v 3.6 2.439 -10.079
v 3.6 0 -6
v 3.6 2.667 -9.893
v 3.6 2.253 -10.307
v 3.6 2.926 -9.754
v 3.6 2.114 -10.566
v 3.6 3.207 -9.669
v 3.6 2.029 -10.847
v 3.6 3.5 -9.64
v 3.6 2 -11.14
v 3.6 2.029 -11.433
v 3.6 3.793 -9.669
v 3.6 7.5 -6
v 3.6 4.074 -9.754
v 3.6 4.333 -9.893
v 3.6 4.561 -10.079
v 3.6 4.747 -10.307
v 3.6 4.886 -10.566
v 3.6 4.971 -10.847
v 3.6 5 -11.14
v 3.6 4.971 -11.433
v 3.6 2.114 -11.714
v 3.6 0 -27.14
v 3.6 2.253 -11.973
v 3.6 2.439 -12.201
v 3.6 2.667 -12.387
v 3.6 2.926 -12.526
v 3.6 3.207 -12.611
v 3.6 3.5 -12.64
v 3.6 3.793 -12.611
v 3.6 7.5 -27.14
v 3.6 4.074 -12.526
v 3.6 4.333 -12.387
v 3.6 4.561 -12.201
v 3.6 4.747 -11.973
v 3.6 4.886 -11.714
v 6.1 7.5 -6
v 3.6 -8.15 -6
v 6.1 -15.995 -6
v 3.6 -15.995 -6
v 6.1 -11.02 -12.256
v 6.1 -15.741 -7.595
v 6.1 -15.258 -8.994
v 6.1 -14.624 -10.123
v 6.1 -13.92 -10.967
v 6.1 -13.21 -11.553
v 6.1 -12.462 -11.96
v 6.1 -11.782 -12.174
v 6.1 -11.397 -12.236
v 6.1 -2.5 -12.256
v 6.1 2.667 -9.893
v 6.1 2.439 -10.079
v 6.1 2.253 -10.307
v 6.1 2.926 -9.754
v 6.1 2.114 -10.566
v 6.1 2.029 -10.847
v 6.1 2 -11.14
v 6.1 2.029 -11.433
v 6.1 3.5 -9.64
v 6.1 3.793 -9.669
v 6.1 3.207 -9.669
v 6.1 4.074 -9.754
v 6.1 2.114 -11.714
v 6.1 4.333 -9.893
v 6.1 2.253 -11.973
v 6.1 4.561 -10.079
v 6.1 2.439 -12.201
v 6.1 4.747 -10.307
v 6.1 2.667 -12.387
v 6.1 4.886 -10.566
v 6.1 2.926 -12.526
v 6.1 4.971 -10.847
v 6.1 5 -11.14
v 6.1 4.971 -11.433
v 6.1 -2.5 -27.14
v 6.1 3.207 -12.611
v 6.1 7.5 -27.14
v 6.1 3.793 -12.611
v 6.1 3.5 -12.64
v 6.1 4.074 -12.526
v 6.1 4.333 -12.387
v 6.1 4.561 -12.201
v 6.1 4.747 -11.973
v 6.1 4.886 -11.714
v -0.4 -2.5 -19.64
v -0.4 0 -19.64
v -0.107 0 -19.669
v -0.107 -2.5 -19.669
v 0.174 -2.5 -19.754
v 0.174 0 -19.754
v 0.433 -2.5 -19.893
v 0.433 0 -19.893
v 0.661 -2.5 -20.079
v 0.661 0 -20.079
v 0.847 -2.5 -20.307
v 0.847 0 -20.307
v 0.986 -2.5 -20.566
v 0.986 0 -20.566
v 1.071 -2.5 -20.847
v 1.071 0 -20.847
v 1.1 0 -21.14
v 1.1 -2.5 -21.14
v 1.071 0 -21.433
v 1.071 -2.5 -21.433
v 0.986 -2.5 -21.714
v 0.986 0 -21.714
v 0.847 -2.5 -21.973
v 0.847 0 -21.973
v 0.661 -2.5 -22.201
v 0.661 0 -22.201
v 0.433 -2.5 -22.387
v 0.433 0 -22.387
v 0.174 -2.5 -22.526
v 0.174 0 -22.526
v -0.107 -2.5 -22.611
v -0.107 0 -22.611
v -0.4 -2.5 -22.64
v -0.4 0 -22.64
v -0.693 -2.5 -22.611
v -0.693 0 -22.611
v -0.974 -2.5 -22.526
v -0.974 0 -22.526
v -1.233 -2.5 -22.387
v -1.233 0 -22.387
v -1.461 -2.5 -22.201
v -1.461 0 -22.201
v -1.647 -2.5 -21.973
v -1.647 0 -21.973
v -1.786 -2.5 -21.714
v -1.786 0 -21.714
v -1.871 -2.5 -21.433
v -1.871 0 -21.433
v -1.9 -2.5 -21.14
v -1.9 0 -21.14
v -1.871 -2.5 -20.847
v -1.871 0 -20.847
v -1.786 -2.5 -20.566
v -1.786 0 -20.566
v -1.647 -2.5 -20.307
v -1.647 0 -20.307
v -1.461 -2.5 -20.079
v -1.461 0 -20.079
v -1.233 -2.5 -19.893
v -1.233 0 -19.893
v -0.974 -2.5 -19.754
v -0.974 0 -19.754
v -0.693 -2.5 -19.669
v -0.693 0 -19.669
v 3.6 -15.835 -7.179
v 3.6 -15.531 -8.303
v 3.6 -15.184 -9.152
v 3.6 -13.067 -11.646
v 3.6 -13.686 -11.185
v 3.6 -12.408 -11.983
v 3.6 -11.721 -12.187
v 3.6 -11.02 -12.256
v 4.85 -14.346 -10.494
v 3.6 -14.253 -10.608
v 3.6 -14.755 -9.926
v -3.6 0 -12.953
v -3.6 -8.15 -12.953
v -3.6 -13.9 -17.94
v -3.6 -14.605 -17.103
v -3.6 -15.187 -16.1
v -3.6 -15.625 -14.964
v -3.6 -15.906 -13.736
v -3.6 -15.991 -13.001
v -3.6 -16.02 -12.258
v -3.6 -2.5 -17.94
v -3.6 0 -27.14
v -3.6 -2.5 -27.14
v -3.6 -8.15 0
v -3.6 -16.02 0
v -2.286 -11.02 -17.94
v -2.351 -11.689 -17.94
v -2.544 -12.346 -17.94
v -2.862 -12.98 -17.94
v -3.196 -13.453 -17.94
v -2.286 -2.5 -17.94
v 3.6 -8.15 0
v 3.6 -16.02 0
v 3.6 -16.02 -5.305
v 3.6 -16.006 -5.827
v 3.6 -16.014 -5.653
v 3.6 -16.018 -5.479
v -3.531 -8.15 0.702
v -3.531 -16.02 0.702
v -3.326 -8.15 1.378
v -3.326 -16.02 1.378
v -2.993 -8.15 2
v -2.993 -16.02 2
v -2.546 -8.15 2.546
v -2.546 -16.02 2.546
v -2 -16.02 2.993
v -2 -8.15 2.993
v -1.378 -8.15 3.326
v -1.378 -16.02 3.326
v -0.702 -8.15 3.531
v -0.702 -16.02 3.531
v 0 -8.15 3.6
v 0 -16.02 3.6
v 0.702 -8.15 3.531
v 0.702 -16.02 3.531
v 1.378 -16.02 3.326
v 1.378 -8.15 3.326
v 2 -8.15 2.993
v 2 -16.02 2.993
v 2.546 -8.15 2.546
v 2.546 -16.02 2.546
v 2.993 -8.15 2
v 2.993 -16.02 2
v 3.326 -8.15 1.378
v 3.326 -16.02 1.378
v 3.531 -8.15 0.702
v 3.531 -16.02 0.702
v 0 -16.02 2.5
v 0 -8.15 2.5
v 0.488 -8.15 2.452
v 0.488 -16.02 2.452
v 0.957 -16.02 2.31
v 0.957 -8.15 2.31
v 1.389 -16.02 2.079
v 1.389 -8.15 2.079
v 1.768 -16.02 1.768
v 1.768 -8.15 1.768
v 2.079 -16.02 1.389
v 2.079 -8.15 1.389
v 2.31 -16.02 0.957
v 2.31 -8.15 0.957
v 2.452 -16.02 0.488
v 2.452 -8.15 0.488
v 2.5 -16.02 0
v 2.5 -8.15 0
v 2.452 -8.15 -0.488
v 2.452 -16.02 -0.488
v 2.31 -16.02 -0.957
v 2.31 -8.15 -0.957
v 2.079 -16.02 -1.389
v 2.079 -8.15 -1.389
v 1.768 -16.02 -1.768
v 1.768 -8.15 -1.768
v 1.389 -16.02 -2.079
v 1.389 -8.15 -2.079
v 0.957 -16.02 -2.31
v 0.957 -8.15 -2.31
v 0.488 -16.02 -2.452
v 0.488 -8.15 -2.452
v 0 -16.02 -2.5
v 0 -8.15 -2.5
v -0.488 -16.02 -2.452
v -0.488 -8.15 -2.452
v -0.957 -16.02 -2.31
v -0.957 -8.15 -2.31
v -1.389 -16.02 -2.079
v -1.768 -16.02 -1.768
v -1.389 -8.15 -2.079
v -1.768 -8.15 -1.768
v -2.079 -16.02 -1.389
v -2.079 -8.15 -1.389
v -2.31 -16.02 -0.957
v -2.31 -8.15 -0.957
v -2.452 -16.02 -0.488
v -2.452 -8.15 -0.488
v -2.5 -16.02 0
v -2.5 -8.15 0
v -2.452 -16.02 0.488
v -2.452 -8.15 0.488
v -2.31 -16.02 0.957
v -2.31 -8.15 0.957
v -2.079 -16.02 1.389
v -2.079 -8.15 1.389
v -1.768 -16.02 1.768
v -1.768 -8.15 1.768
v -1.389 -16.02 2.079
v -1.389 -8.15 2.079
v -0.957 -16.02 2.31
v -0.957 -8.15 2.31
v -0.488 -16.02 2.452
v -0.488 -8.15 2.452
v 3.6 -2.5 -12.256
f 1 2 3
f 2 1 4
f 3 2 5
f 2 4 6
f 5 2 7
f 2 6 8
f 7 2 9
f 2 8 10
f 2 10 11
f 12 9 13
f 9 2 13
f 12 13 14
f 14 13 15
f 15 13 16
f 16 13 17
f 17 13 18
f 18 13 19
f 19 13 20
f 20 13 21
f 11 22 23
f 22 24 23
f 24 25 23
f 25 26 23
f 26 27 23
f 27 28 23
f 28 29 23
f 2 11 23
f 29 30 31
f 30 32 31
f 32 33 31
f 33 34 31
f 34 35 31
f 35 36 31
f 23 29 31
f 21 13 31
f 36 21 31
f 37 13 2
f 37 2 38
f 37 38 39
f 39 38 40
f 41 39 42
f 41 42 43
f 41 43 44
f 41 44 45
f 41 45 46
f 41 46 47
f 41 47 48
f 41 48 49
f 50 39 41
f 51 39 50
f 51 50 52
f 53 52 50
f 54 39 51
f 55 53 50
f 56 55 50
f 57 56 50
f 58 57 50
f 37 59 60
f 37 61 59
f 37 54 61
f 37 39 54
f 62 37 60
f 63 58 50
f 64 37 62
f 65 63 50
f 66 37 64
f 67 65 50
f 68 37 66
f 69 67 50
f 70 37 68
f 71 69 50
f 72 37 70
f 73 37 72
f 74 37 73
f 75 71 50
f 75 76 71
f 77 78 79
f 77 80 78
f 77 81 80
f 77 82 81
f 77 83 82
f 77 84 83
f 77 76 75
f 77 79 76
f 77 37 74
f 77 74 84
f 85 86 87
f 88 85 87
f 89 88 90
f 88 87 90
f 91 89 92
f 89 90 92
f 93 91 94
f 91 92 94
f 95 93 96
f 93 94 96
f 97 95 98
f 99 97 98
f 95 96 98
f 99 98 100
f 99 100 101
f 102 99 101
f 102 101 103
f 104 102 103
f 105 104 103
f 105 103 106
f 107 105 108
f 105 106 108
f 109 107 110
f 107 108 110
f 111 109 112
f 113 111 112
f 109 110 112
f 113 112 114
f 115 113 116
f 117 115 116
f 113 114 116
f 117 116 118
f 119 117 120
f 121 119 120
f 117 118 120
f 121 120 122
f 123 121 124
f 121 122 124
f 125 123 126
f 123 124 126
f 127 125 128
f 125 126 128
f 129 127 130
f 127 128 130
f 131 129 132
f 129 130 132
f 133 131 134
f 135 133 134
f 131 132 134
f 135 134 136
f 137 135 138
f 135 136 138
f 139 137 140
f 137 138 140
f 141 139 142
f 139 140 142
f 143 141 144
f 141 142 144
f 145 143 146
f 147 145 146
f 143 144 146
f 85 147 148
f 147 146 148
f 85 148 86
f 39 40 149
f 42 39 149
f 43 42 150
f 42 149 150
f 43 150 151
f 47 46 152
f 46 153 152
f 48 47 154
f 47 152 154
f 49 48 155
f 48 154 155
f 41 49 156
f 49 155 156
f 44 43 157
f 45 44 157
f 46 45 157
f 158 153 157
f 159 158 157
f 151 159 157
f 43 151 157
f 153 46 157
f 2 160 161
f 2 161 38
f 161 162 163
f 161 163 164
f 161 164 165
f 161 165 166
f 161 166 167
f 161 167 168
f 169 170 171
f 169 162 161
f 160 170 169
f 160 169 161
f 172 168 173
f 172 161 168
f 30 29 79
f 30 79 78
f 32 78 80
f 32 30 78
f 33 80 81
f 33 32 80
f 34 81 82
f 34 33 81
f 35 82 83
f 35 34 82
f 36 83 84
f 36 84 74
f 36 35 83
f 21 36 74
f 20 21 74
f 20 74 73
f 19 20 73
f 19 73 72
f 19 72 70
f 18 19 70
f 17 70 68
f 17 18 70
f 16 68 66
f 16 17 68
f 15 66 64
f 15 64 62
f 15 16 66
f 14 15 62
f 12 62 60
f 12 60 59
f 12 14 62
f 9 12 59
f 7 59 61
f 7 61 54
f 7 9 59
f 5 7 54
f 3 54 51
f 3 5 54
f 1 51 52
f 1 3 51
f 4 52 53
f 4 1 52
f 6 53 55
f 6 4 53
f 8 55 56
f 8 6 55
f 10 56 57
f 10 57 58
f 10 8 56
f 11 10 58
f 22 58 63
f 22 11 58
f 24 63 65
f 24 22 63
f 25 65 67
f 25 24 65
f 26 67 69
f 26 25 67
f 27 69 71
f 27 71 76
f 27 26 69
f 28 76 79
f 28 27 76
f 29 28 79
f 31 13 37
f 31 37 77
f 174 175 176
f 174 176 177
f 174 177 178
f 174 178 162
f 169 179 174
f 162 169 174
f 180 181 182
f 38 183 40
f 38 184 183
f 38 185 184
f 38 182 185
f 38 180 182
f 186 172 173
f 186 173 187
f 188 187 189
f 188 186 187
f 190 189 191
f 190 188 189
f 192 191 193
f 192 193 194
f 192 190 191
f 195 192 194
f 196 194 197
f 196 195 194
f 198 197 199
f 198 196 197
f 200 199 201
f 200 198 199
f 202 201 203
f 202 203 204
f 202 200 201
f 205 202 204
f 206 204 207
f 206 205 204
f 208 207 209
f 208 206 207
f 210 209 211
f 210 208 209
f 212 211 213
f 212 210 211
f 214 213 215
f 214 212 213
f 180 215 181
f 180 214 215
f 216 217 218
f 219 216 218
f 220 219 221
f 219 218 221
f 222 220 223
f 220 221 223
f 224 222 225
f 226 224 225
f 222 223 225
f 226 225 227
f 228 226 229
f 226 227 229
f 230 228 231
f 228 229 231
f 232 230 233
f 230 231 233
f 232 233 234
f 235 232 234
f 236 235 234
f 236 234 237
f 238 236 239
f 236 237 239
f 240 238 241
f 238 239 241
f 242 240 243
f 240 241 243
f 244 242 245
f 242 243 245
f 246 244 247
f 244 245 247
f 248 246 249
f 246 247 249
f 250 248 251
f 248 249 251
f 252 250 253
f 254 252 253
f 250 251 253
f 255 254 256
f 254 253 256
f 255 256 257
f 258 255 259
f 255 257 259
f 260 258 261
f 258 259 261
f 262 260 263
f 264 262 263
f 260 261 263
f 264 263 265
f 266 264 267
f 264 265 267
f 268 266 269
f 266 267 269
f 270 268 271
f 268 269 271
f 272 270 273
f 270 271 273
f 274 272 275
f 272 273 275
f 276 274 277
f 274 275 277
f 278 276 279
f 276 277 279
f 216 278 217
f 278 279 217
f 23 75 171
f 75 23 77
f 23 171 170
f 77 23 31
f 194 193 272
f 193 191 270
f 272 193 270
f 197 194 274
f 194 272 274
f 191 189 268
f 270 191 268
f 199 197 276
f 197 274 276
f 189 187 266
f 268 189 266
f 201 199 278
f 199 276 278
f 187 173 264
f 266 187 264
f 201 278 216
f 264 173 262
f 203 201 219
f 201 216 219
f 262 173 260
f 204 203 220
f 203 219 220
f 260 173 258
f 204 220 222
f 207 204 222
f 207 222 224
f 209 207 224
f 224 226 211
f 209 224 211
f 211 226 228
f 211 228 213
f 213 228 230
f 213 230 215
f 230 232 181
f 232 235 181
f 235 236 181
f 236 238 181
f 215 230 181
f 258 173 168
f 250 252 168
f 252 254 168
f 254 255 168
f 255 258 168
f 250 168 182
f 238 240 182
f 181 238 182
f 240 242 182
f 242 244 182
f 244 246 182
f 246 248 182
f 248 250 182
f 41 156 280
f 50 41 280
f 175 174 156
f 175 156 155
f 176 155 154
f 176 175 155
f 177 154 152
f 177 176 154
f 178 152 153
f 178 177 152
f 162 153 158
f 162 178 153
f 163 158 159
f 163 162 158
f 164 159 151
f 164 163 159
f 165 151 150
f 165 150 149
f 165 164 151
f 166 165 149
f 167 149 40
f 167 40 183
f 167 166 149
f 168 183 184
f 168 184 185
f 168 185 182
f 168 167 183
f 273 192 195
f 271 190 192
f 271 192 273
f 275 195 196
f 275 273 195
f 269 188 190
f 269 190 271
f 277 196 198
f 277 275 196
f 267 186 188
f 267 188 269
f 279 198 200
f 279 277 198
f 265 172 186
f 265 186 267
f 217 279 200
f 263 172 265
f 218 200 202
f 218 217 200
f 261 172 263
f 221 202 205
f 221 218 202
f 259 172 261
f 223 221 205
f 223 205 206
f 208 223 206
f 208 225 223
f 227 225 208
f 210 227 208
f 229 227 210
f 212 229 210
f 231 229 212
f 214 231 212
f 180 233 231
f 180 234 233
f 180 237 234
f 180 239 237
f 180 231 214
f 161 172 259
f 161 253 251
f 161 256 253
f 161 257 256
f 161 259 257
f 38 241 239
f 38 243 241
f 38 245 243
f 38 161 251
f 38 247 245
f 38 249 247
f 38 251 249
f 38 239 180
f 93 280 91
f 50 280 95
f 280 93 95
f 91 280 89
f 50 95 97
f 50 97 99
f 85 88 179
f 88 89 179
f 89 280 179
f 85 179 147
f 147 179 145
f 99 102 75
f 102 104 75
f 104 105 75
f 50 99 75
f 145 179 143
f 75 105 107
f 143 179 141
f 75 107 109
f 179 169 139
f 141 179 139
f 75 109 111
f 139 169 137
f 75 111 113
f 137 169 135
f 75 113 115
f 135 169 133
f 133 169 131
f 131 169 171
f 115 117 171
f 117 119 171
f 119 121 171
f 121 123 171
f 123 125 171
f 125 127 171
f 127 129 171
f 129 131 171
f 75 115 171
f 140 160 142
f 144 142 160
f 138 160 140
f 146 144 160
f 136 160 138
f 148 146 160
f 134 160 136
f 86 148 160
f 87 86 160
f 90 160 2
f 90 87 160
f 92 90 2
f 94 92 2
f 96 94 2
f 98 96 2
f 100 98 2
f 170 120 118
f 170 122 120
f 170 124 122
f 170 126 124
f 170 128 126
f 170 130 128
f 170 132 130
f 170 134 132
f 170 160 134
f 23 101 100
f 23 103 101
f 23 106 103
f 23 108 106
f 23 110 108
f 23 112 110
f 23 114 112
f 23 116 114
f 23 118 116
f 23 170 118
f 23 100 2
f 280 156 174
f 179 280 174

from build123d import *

# Parameters (mm, degrees)
CROQUIS1_R              = 1.5
SALIENTE_EXTRUIR1_DEPTH = 2.5
SALIENTE_EXTRUIR2_START = -8.15
CROQUIS1_4_R            = 2.5
SALIENTE_EXTRUIR2_DEPTH = 7.87
SALIENTE_EXTRUIR3_DEPTH = 16.02
REDONDEO1_R             = 5
CROQUIS3_W              = 21.14
CROQUIS3_H              = 7.5
CROQUIS3_R              = 1.5
SALIENTE_EXTRUIR4_DEPTH = 2.5


with BuildPart() as part:
    # Croquis1 → Saliente-Extruir1 (new body)
    with BuildSketch(Plane(origin=(0, 0, 0), x_dir=(1, 0, 0), z_dir=(0, 1, 0))):
        Polygon((3.6, 27.14), (-3.6, 27.14), (-3.6, 12.952959179), (3.6, 6), align=None)
        with Locations(Location((-0.4, 21.14, 0), (0, 0, 270))):
            Circle(CROQUIS1_R, mode=Mode.SUBTRACT)
    extrude(amount=-SALIENTE_EXTRUIR1_DEPTH)



with BuildPart() as body_2:
    # Croquis1<4> → Saliente-Extruir2 (new body)
    with BuildSketch(Plane(origin=(0, 0, 0), x_dir=(1, 0, 0), z_dir=(0, 1, 0)).offset(SALIENTE_EXTRUIR2_START)):
        with BuildLine():
            Line((3.6, 6), (-3.6, 12.952959179))
            Line((-3.6, 12.952959179), (-3.6, 0))
            ThreePointArc((-3.6, 0), (0, -3.6), (3.6, 0))
            Line((3.6, 0), (3.6, 6))
        make_face()
        with Locations(Location((0, 0, 0), (0, 0, 270))):
            Circle(CROQUIS1_4_R, mode=Mode.SUBTRACT)
    extrude(amount=-SALIENTE_EXTRUIR2_DEPTH)


with BuildPart() as part_1:
    add(part.part)

    add(body_2.part)  # Saliente-Extruir3 merges body 2
    # Croquis1<5> → Saliente-Extruir3 (add)
    with BuildSketch(Plane(origin=(0, 0, 0), x_dir=(1, 0, 0), z_dir=(0, 1, 0))):
        Polygon((-2.286227518, 17.94), (-3.6, 17.94), (-3.6, 12.952959179), (3.6, 6), (3.6, 12.25573616), align=None)
    extrude(amount=-SALIENTE_EXTRUIR3_DEPTH)

    # Redondeo1
    redondeo1_edges = [part_1.edges().sort_by_distance(p)[0] for p in [
        (0.656886241, -16.02, -15.09786808),
    ]]
    fillet(redondeo1_edges, radius=REDONDEO1_R)

    # Croquis3 → Saliente-Extruir4 (add)
    # profile 1 of 2: a face of its own
    with BuildSketch(Plane(origin=(3.6, 0, 0), x_dir=(0, 0, -1), z_dir=(1, 0, 0))):
        with BuildLine():
            Line((6, 0), (6, -8.15))
            Line((6, -8.15), (6, -15.994937186))
            add(Edge.make_bspline(
                [(6, -15.994937186), (12.25573616, -15.542670169), (12.25573616, -11.02)],
                knots=[4.821475205, 4.821475205, 4.821475205, 6.283185307, 6.283185307, 6.283185307], degree=2, weights=[0.962144349, 0.727447175, 1]))
            Line((12.25573616, -11.02), (12.25573616, -2.5))
            Line((12.25573616, -2.5), (27.14, -2.5))
            Line((27.14, -2.5), (27.14, 0))
            Line((27.14, 0), (6, 0))
        make_face()
    # profile 2 of 2: a face of its own
    with BuildSketch(Plane(origin=(3.6, 0, 0), x_dir=(0, 0, -1), z_dir=(1, 0, 0))):
        with Locations((16.57, 3.75)):
            Rectangle(CROQUIS3_W, CROQUIS3_H)
        with Locations((11.14, 3.5)):
            Circle(CROQUIS3_R, mode=Mode.SUBTRACT)
    extrude(amount=SALIENTE_EXTRUIR4_DEPTH)


solid = part_1.part
